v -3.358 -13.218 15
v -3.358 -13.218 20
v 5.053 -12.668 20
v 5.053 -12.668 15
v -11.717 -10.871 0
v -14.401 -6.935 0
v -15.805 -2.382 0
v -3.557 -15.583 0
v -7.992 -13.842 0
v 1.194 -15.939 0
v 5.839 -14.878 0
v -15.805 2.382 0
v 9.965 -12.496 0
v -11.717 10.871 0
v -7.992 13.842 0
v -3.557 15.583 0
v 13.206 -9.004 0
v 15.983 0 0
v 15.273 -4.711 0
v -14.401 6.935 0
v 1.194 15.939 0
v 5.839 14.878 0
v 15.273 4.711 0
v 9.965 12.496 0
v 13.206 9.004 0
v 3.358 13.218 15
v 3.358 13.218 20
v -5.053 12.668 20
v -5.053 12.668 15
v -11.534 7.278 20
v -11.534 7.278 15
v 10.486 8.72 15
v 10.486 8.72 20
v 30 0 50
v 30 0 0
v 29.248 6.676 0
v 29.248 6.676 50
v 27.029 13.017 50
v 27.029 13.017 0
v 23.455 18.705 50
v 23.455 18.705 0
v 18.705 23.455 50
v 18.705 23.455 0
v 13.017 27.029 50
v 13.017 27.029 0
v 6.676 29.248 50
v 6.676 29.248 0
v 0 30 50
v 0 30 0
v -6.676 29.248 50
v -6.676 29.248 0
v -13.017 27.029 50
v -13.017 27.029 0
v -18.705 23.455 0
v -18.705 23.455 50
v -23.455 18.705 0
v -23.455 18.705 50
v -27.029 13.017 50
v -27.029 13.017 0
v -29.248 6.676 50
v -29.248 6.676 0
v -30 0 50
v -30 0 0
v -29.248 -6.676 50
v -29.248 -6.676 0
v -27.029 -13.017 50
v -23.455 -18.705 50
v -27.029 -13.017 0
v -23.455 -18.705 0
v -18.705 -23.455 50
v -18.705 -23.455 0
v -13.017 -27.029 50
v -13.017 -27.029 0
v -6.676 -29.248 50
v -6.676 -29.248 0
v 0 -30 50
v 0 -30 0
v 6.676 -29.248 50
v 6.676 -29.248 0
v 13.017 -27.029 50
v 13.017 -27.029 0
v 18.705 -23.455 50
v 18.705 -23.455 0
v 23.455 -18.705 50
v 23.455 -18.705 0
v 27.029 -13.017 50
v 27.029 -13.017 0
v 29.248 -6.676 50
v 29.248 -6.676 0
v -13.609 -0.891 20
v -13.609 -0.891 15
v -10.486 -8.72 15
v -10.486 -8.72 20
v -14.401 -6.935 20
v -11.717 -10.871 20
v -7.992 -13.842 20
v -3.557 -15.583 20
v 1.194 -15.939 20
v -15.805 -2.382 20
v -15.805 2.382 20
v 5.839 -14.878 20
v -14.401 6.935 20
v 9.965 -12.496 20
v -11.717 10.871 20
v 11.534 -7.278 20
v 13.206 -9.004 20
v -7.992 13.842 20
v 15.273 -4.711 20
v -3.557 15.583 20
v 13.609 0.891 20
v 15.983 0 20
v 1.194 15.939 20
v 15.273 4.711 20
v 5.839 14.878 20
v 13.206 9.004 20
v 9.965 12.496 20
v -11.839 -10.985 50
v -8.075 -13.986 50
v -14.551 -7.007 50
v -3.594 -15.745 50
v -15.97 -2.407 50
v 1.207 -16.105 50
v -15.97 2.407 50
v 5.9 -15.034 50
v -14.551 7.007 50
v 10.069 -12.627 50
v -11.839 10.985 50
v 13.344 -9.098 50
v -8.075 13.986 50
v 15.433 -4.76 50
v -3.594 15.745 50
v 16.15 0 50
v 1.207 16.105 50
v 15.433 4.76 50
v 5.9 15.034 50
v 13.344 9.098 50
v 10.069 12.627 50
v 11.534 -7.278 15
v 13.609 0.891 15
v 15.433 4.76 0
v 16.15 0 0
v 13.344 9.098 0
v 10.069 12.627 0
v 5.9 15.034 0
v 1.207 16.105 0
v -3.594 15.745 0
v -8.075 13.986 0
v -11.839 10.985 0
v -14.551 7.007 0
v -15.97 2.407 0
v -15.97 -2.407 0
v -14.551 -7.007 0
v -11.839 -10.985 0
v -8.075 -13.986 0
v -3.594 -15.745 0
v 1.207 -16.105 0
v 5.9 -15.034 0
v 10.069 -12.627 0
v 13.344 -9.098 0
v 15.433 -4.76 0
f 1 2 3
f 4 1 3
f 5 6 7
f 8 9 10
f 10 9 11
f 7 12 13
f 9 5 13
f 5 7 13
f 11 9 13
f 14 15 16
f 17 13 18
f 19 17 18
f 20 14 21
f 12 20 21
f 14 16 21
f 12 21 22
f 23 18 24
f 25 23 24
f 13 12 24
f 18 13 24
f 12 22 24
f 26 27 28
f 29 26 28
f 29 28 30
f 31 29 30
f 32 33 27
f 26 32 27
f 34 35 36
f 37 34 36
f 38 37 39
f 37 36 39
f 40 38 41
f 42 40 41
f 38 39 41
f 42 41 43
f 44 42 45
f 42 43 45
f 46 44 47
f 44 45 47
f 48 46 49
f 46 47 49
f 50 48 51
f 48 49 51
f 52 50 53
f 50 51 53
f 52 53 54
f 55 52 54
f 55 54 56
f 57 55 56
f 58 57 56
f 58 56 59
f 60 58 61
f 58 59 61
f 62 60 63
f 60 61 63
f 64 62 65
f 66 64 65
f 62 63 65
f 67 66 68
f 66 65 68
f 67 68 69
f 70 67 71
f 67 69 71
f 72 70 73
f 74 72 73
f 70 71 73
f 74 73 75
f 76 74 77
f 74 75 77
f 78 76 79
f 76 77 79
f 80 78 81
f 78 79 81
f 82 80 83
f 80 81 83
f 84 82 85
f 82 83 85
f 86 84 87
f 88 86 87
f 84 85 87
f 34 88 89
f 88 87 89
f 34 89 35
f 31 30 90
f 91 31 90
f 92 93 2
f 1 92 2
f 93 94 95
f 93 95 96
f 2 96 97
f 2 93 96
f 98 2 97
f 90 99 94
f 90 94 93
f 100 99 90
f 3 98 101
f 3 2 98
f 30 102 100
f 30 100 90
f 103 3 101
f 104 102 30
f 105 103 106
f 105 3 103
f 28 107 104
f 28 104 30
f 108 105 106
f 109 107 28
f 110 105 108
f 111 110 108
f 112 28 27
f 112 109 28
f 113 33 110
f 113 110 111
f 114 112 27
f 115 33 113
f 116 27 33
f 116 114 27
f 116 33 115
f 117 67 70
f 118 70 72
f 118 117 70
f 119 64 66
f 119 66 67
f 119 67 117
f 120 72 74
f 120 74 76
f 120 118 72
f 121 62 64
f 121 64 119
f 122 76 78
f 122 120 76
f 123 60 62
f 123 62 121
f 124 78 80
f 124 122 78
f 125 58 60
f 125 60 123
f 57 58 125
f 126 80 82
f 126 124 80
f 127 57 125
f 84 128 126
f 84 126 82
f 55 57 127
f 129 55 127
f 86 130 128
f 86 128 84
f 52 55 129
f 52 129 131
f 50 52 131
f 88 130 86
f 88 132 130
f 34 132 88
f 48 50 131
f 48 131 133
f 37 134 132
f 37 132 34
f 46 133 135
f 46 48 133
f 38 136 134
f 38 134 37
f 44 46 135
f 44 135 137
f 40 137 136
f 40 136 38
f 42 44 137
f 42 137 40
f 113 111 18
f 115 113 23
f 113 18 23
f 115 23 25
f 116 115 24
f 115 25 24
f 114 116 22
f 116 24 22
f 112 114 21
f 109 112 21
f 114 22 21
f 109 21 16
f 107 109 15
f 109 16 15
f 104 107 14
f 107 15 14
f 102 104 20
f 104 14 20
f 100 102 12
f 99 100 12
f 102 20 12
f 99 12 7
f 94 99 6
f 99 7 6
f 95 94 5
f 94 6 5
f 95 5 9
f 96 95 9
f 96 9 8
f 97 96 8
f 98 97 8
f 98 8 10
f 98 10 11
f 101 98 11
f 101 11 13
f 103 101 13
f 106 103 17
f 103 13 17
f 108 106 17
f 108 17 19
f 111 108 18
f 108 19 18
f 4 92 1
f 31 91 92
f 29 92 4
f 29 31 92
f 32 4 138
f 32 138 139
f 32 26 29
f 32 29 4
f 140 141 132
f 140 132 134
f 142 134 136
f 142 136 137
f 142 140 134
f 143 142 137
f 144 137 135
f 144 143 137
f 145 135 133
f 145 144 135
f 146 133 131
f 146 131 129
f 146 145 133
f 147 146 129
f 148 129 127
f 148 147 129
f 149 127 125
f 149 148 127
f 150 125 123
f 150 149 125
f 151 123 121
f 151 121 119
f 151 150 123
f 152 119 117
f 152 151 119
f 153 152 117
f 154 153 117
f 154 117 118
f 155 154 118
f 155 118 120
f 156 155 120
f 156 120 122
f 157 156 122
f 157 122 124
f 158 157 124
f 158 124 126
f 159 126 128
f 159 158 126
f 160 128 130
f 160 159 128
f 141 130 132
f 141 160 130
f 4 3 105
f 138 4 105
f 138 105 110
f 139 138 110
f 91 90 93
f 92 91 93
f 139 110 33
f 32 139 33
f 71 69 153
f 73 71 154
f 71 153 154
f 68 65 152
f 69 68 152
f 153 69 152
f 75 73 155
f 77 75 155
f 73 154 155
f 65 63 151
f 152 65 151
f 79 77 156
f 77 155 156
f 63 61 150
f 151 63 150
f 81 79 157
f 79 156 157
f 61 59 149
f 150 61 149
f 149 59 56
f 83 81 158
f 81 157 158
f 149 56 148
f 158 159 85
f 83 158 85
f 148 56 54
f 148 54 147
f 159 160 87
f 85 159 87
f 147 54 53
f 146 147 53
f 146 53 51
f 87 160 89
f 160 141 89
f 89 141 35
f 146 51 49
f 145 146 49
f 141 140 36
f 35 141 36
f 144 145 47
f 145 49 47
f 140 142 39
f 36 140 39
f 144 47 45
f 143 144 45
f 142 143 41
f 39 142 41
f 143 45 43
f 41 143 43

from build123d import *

# Parameters (mm, degrees)
F0_R     = 30
F0_R_2   = 16.15
F1_DEPTH = 50
F2_R     = 15.9833570906
F3_DEPTH = 20
F6_DEPTH = 5
F7_R     = 5
F8_DEPTH = 5
F9_DEPTH = 5


with BuildPart() as f1:
    # F0 (on Top) → F1 (new body)
    with BuildSketch(Plane.XY):
        Circle(F0_R)
        Circle(F0_R_2, mode=Mode.SUBTRACT)
    extrude(amount=F1_DEPTH)

    # F7 (on face) → F8 (cut)
    with BuildSketch(Plane.XY.offset(20)):
        Circle(F7_R)
    extrude(amount=-F8_DEPTH, mode=Mode.SUBTRACT)

    # F7 (on face) → F9 (cut)
    with BuildSketch(Plane.XY.offset(20)):
        Circle(F7_R)
    extrude(amount=-F9_DEPTH, mode=Mode.SUBTRACT)


with BuildPart() as f3:
    # F2 (on Top) → F3 (new body)
    with BuildSketch(Plane.XY):
        Circle(F2_R)
    extrude(amount=F3_DEPTH)

    # F5 (on face) → F6 (cut)
    with BuildSketch(Plane.XY.offset(20)):
        Polygon((-5.0526188535, 12.6676582507), (-11.5335172194, 7.2784959563), (-13.6090040174, -0.8908044065), (-10.4863138337, -8.7198477634), (-3.3582081823, -13.2182056513), (5.0526188535, -12.6676582507), (11.5335172194, -7.2784959563), (13.6090040174, 0.8908044065), (10.4863138337, 8.7198477634), (3.3582081823, 13.2182056513), align=None)
    extrude(amount=-F6_DEPTH, mode=Mode.SUBTRACT)


solid = Compound([f1.part, f3.part])
